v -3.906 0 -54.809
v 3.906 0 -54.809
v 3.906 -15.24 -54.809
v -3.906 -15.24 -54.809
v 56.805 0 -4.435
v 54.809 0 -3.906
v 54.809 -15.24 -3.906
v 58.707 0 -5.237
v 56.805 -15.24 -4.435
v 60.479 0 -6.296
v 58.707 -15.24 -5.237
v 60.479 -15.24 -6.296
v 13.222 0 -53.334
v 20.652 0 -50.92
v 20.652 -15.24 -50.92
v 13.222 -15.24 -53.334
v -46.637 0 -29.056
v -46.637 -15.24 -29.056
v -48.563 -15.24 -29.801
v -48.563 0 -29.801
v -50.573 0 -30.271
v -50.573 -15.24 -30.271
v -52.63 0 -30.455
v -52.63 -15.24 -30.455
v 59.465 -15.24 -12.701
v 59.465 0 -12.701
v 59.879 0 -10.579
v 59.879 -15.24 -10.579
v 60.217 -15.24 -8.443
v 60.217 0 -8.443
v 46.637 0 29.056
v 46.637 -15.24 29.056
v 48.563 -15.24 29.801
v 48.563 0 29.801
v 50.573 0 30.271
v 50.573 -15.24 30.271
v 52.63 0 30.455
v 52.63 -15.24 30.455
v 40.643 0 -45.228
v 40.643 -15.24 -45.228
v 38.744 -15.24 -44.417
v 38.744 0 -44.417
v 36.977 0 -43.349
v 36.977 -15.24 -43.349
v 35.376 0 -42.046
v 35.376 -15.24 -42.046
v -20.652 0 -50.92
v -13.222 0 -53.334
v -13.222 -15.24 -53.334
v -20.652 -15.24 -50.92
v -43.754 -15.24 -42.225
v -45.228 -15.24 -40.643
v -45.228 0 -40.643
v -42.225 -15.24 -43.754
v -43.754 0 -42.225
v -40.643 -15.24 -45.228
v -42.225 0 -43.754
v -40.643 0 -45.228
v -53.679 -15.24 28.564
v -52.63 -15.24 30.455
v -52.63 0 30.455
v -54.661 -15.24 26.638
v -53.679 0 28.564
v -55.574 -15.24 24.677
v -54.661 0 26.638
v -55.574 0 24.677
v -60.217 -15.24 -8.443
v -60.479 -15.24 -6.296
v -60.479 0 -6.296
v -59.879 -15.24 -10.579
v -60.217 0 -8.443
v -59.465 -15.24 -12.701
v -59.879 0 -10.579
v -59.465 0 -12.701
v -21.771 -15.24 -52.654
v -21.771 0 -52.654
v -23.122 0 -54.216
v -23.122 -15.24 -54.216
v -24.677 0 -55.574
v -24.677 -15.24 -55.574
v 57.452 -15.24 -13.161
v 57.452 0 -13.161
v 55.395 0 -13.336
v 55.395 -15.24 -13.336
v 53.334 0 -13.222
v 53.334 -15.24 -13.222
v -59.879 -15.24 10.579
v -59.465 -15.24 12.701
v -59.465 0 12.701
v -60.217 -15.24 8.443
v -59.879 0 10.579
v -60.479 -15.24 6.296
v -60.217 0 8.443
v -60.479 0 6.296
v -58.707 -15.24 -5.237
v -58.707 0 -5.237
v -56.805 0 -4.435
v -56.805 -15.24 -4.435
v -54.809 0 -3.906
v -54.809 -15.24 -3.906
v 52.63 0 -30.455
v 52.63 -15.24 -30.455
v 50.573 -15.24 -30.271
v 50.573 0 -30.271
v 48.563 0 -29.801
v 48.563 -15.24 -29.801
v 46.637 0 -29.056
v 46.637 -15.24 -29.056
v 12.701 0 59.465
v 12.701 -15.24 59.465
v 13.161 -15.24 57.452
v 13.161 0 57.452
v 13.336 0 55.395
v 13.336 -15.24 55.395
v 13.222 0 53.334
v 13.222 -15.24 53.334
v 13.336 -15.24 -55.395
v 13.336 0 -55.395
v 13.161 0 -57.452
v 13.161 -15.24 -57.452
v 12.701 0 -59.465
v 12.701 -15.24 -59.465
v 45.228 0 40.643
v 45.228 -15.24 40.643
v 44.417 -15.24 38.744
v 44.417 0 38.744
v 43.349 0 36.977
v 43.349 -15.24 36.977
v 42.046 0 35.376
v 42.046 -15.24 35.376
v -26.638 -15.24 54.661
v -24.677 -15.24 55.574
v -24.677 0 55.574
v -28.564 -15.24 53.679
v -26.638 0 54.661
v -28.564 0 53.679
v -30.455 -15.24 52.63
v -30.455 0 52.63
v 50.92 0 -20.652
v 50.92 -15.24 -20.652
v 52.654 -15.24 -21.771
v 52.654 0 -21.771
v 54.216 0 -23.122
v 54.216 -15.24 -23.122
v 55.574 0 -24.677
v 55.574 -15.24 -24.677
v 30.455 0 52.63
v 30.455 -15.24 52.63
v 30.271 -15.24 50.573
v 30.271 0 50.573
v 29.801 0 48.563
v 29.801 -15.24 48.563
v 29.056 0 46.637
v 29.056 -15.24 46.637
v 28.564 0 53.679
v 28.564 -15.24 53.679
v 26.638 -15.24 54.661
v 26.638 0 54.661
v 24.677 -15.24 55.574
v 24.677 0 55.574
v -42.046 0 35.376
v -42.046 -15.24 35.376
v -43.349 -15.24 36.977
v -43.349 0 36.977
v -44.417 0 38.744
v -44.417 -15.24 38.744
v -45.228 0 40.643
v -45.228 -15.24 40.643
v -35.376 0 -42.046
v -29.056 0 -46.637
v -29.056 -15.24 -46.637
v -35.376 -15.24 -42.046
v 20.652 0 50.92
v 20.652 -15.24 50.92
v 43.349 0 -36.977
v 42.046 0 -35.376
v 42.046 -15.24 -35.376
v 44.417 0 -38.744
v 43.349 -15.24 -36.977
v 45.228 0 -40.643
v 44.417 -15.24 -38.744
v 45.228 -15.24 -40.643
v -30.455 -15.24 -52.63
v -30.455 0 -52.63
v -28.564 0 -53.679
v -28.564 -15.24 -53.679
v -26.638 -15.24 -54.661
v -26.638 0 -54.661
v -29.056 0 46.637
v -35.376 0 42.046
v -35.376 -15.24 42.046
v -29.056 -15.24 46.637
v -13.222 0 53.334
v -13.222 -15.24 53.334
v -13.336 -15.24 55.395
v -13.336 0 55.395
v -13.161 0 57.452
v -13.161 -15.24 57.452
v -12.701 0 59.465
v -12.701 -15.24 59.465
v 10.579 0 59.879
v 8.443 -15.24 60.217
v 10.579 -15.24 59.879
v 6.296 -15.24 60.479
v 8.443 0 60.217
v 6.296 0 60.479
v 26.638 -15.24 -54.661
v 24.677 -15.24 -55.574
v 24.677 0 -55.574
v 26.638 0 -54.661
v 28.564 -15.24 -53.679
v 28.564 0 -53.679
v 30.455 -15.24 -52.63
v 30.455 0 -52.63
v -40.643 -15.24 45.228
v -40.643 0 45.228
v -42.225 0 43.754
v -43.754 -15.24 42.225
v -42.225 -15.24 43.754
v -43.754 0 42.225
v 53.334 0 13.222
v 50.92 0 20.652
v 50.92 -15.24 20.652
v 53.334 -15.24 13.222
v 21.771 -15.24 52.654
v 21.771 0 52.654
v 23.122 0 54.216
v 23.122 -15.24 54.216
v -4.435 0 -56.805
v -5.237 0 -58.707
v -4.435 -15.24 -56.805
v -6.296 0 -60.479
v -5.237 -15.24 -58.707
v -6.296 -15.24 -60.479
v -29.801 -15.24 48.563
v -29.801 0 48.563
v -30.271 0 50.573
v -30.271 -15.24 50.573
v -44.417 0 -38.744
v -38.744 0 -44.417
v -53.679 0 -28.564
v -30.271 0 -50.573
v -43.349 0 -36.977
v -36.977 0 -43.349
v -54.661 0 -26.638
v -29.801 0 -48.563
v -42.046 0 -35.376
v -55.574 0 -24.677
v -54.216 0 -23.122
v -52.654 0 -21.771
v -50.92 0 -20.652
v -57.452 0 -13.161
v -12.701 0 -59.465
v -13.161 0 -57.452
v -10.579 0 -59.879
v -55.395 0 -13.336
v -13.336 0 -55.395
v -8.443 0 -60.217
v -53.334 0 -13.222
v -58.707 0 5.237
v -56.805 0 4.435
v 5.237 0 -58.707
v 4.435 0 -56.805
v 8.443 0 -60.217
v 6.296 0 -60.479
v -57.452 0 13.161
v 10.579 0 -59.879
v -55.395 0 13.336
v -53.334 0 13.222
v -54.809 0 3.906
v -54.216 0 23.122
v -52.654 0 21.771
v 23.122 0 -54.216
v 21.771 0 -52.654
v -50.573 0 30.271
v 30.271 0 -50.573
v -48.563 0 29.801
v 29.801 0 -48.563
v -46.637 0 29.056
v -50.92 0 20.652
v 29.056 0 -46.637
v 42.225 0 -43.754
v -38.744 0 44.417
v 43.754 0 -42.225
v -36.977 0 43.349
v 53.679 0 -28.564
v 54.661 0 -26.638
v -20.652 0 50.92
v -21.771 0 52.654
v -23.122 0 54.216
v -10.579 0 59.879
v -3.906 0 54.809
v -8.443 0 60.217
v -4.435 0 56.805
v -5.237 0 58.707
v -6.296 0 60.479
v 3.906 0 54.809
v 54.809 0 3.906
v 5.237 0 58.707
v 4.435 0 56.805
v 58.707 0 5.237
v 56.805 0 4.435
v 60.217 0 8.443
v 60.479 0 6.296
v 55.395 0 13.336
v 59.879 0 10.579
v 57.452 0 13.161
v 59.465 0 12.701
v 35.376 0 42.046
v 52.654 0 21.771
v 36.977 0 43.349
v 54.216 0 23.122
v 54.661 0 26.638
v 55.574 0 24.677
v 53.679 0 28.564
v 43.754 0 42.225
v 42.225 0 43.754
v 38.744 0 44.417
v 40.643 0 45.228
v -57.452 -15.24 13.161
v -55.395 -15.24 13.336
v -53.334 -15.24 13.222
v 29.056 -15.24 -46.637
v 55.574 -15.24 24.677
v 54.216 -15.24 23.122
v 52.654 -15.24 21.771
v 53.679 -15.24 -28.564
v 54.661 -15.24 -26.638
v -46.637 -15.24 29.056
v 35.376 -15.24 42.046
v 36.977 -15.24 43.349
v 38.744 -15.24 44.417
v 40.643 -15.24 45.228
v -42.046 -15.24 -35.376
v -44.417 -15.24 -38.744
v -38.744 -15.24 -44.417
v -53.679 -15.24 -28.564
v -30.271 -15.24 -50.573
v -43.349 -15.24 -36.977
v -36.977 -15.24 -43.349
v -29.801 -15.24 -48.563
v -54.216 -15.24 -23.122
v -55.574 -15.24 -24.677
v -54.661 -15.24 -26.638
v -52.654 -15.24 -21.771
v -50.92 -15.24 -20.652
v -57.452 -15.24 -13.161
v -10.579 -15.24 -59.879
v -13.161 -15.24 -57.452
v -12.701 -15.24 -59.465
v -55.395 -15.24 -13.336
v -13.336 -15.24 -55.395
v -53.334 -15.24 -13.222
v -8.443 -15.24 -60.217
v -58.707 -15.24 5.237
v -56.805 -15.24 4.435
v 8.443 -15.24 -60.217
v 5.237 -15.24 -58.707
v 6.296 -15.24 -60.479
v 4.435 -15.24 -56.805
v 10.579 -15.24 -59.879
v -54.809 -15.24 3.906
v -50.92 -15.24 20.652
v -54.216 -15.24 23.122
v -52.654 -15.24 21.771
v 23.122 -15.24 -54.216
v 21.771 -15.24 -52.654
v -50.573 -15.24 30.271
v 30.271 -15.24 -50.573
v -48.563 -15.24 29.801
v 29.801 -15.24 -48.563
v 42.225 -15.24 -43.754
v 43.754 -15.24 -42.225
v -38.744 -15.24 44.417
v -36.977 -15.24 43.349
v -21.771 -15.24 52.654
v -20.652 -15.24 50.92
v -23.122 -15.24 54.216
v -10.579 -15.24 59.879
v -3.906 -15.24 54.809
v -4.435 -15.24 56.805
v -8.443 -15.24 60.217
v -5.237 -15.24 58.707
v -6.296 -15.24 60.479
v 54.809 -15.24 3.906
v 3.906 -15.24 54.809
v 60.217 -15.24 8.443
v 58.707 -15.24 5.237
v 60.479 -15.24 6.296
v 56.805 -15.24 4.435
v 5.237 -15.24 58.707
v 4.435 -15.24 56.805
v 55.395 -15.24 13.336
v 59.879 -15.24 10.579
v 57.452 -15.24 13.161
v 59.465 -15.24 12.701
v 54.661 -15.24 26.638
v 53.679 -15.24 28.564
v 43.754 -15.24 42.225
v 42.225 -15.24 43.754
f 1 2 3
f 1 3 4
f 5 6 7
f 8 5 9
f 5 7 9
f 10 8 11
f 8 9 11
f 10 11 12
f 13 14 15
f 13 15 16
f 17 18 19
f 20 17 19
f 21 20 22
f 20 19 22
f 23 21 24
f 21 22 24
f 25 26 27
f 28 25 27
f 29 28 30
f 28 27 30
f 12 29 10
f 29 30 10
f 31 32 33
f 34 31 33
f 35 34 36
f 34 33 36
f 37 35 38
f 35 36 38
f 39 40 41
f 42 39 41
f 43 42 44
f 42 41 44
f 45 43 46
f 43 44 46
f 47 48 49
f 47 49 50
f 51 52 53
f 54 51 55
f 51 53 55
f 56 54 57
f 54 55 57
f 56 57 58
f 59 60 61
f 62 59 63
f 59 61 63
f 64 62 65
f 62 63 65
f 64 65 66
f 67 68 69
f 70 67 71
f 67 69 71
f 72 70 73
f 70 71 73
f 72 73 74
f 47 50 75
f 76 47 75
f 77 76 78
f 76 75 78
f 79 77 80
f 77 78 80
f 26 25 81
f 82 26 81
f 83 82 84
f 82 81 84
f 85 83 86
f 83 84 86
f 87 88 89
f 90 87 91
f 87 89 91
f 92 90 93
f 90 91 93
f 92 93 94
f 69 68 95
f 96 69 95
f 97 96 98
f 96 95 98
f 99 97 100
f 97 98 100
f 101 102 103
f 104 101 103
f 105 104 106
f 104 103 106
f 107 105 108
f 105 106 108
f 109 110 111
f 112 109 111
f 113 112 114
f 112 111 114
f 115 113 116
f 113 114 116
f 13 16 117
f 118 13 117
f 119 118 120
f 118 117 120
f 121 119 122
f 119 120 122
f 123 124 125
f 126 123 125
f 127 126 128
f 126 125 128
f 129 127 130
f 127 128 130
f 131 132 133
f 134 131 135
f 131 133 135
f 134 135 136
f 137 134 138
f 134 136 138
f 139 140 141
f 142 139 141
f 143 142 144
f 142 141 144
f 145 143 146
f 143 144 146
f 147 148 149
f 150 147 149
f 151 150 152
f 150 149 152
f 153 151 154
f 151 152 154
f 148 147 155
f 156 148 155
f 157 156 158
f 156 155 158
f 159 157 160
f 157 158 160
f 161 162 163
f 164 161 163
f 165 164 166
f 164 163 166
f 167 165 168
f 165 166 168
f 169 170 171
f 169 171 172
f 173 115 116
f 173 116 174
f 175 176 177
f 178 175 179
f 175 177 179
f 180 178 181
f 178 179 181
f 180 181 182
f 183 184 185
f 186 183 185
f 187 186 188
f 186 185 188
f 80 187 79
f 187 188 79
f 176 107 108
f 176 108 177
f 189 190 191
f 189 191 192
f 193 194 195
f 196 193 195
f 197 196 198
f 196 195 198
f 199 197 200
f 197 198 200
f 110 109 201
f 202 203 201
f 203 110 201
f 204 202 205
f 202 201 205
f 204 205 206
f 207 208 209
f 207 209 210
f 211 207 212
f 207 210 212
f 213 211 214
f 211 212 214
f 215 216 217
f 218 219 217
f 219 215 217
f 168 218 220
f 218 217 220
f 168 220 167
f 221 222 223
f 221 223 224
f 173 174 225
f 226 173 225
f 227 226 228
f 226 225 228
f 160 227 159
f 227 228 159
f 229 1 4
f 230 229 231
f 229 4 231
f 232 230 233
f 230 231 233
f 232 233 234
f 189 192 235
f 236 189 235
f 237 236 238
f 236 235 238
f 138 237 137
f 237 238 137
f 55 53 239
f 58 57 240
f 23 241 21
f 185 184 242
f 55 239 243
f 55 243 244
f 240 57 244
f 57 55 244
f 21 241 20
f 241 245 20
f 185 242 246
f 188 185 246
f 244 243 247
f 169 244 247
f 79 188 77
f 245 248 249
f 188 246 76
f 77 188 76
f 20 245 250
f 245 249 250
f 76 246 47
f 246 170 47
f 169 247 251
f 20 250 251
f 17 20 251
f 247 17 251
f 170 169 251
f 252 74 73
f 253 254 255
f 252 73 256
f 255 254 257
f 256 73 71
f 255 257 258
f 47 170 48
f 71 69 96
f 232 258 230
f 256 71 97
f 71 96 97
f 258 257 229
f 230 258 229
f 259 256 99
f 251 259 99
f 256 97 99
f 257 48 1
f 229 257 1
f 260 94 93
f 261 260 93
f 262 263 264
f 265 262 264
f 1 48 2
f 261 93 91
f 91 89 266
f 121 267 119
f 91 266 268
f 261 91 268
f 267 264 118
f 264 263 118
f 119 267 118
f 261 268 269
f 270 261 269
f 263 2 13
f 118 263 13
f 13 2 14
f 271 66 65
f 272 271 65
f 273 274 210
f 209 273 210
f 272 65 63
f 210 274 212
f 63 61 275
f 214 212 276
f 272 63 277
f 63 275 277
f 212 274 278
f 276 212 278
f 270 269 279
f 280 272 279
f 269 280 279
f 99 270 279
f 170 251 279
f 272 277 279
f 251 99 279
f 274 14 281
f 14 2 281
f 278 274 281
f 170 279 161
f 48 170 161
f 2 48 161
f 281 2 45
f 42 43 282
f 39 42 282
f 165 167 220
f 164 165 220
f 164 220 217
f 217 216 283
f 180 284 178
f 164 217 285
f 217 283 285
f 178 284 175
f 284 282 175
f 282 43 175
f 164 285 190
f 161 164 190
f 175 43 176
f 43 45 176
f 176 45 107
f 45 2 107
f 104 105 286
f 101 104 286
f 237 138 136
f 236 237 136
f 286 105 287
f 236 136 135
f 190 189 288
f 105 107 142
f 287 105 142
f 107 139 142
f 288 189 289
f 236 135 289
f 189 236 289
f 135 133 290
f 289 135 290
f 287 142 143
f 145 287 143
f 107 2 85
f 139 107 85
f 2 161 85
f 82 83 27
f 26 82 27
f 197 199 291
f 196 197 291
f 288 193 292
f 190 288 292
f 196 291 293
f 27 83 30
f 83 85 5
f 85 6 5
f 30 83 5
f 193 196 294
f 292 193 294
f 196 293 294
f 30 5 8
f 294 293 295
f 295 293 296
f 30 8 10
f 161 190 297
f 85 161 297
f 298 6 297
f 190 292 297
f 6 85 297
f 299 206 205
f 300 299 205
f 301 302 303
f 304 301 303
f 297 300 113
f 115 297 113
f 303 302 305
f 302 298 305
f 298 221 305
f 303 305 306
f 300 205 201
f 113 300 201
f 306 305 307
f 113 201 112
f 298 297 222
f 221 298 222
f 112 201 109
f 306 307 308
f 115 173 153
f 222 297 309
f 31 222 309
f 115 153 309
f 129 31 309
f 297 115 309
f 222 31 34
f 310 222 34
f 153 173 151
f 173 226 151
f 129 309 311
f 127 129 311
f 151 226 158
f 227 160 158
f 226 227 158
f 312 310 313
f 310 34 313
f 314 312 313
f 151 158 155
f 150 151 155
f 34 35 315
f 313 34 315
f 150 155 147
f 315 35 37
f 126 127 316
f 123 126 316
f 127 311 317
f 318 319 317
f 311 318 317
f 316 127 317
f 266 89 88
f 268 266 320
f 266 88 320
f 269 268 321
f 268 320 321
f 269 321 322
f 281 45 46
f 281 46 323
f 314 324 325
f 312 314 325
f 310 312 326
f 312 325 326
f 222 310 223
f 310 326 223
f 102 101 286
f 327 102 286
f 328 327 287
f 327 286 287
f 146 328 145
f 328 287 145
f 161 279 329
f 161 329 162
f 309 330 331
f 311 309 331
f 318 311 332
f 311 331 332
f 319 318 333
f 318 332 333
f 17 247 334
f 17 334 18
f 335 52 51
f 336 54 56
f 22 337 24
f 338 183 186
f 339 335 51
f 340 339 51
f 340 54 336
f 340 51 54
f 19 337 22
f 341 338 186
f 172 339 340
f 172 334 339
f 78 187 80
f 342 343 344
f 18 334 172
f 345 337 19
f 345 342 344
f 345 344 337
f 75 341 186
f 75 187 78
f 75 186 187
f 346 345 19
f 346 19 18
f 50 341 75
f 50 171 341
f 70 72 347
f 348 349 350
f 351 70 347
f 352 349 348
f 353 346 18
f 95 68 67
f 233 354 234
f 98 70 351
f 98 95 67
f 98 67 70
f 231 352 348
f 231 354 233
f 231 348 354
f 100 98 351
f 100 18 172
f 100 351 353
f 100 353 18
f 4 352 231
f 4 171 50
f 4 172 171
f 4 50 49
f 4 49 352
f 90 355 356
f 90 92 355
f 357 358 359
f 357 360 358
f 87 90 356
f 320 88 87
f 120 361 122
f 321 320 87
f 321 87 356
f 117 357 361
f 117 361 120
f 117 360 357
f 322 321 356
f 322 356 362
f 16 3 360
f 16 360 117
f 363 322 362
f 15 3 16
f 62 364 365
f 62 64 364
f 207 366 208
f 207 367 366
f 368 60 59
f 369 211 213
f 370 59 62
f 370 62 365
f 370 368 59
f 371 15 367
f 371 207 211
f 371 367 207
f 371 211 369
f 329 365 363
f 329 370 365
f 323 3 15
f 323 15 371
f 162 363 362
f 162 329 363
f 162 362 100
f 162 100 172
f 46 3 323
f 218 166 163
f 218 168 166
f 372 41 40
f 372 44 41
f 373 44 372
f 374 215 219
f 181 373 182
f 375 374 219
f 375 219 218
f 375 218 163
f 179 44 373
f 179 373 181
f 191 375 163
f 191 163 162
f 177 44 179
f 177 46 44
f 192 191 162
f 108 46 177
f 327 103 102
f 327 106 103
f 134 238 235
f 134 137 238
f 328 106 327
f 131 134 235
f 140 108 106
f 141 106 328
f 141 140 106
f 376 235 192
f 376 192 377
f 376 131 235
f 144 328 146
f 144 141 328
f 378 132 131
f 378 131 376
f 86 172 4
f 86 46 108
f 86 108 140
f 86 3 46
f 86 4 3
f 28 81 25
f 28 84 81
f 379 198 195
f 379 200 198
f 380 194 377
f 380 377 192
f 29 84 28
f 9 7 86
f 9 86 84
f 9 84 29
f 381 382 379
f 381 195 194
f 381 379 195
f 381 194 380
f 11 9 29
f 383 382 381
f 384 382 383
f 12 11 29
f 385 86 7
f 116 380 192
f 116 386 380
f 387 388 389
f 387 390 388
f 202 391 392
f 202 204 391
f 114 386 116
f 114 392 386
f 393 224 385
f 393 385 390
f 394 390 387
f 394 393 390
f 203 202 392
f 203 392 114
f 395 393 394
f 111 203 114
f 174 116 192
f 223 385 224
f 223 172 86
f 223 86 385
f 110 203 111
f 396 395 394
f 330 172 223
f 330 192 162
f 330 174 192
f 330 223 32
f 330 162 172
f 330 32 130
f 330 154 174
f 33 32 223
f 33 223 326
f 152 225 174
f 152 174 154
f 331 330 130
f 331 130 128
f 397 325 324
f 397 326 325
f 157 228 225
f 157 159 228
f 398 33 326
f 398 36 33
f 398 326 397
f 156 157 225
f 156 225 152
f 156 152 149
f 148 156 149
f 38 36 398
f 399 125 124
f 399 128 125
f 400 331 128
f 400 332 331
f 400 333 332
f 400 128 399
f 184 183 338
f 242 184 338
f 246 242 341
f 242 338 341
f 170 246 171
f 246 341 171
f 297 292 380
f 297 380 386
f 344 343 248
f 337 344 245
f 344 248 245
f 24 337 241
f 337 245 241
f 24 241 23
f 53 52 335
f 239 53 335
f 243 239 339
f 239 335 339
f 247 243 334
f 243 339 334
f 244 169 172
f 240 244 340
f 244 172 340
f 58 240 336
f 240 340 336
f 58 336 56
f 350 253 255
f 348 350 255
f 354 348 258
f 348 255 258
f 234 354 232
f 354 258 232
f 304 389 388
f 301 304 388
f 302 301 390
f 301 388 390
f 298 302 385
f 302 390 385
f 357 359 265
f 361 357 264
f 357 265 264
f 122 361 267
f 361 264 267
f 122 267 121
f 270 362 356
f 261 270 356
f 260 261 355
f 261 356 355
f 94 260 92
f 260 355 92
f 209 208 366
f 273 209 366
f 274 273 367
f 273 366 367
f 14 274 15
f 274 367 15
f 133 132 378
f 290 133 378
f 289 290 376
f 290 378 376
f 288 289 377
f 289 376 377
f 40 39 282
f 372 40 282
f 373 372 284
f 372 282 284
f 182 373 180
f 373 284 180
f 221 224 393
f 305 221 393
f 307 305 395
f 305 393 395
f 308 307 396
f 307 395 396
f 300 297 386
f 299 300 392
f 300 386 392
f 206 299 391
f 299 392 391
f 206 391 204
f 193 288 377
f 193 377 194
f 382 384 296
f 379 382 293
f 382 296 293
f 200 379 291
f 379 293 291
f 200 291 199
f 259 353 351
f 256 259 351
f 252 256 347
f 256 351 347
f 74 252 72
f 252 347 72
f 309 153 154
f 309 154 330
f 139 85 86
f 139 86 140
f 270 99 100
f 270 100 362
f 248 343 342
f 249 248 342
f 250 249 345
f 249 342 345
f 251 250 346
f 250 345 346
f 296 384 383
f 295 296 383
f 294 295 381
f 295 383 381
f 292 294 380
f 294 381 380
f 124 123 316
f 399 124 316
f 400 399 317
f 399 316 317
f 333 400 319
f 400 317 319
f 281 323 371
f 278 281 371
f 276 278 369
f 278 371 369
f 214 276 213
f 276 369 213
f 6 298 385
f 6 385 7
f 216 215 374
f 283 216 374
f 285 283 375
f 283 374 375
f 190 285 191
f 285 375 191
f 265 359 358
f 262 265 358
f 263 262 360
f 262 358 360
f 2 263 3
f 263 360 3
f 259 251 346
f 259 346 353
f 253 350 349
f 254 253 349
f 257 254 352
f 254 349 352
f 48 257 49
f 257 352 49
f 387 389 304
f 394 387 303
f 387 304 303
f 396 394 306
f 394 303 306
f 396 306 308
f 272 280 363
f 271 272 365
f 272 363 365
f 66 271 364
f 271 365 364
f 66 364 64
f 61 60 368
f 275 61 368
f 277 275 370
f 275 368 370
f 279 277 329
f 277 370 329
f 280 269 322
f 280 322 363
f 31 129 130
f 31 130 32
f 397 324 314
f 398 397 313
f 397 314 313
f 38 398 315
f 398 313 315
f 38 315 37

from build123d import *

# Parameters (mm, degrees)
F0_R            = 60.8062922789
F1_DEPTH        = 15.24
F3_DEPTH        = 15.241
F3_COPIES_COUNT = 20


# Not quite as in the source:
# - a pattern or mirror of a feature is missing from the dataset's text; its kind, count and spacing are read off the source's solid


with BuildPart() as f1:
    # F0 (on Front) → F1 (new body)
    with BuildSketch(Plane.XZ):
        Circle(F0_R)
    extrude(amount=F1_DEPTH)

    # F2 (on face) → F3 (cut, through all)
    with BuildSketch(Plane.XZ.offset(15.24)):
        with BuildLine():
            ThreePointArc((-10.0692585111, 64.2209947109), (-8.0132671596, 62.5211963323), (-6.2964195687, 60.4794203124))
            ThreePointArc((-6.2964195687, 60.4794203124), (0, 60.8062922789), (6.2964195687, 60.4794203124))
            ThreePointArc((6.2964195687, 60.4794203124), (8.0132671596, 62.5211963323), (10.0692585111, 64.2209947109))
            Line((10.0692585111, 64.2209947109), (-10.0692585111, 64.2209947109))
        make_face()
        with BuildLine():
            ThreePointArc((-6.2964195687, 60.4794203124), (-4.802623185, 57.7701032506), (-3.9057508111, 54.8091158271))
            Line((-3.9057508111, 54.8091158271), (0, 54.8091158271))
            Line((0, 54.8091158271), (3.9057508111, 54.8091158271))
            ThreePointArc((3.9057508111, 54.8091158271), (4.802623185, 57.7701032506), (6.2964195687, 60.4794203124))
            ThreePointArc((6.2964195687, 60.4794203124), (0, 60.8062922789), (-6.2964195687, 60.4794203124))
        make_face()
    f3 = extrude(amount=-F3_DEPTH, mode=Mode.SUBTRACT)

    # F3_copies: F3 ×20 about axis
    f3_copies_axis = Axis((0, 0, 0), (0, 1, 0))
    for i in range(1, F3_COPIES_COUNT):
        add(f3.rotate(f3_copies_axis, i * 360 / F3_COPIES_COUNT), mode=Mode.SUBTRACT)


solid = f1.part
